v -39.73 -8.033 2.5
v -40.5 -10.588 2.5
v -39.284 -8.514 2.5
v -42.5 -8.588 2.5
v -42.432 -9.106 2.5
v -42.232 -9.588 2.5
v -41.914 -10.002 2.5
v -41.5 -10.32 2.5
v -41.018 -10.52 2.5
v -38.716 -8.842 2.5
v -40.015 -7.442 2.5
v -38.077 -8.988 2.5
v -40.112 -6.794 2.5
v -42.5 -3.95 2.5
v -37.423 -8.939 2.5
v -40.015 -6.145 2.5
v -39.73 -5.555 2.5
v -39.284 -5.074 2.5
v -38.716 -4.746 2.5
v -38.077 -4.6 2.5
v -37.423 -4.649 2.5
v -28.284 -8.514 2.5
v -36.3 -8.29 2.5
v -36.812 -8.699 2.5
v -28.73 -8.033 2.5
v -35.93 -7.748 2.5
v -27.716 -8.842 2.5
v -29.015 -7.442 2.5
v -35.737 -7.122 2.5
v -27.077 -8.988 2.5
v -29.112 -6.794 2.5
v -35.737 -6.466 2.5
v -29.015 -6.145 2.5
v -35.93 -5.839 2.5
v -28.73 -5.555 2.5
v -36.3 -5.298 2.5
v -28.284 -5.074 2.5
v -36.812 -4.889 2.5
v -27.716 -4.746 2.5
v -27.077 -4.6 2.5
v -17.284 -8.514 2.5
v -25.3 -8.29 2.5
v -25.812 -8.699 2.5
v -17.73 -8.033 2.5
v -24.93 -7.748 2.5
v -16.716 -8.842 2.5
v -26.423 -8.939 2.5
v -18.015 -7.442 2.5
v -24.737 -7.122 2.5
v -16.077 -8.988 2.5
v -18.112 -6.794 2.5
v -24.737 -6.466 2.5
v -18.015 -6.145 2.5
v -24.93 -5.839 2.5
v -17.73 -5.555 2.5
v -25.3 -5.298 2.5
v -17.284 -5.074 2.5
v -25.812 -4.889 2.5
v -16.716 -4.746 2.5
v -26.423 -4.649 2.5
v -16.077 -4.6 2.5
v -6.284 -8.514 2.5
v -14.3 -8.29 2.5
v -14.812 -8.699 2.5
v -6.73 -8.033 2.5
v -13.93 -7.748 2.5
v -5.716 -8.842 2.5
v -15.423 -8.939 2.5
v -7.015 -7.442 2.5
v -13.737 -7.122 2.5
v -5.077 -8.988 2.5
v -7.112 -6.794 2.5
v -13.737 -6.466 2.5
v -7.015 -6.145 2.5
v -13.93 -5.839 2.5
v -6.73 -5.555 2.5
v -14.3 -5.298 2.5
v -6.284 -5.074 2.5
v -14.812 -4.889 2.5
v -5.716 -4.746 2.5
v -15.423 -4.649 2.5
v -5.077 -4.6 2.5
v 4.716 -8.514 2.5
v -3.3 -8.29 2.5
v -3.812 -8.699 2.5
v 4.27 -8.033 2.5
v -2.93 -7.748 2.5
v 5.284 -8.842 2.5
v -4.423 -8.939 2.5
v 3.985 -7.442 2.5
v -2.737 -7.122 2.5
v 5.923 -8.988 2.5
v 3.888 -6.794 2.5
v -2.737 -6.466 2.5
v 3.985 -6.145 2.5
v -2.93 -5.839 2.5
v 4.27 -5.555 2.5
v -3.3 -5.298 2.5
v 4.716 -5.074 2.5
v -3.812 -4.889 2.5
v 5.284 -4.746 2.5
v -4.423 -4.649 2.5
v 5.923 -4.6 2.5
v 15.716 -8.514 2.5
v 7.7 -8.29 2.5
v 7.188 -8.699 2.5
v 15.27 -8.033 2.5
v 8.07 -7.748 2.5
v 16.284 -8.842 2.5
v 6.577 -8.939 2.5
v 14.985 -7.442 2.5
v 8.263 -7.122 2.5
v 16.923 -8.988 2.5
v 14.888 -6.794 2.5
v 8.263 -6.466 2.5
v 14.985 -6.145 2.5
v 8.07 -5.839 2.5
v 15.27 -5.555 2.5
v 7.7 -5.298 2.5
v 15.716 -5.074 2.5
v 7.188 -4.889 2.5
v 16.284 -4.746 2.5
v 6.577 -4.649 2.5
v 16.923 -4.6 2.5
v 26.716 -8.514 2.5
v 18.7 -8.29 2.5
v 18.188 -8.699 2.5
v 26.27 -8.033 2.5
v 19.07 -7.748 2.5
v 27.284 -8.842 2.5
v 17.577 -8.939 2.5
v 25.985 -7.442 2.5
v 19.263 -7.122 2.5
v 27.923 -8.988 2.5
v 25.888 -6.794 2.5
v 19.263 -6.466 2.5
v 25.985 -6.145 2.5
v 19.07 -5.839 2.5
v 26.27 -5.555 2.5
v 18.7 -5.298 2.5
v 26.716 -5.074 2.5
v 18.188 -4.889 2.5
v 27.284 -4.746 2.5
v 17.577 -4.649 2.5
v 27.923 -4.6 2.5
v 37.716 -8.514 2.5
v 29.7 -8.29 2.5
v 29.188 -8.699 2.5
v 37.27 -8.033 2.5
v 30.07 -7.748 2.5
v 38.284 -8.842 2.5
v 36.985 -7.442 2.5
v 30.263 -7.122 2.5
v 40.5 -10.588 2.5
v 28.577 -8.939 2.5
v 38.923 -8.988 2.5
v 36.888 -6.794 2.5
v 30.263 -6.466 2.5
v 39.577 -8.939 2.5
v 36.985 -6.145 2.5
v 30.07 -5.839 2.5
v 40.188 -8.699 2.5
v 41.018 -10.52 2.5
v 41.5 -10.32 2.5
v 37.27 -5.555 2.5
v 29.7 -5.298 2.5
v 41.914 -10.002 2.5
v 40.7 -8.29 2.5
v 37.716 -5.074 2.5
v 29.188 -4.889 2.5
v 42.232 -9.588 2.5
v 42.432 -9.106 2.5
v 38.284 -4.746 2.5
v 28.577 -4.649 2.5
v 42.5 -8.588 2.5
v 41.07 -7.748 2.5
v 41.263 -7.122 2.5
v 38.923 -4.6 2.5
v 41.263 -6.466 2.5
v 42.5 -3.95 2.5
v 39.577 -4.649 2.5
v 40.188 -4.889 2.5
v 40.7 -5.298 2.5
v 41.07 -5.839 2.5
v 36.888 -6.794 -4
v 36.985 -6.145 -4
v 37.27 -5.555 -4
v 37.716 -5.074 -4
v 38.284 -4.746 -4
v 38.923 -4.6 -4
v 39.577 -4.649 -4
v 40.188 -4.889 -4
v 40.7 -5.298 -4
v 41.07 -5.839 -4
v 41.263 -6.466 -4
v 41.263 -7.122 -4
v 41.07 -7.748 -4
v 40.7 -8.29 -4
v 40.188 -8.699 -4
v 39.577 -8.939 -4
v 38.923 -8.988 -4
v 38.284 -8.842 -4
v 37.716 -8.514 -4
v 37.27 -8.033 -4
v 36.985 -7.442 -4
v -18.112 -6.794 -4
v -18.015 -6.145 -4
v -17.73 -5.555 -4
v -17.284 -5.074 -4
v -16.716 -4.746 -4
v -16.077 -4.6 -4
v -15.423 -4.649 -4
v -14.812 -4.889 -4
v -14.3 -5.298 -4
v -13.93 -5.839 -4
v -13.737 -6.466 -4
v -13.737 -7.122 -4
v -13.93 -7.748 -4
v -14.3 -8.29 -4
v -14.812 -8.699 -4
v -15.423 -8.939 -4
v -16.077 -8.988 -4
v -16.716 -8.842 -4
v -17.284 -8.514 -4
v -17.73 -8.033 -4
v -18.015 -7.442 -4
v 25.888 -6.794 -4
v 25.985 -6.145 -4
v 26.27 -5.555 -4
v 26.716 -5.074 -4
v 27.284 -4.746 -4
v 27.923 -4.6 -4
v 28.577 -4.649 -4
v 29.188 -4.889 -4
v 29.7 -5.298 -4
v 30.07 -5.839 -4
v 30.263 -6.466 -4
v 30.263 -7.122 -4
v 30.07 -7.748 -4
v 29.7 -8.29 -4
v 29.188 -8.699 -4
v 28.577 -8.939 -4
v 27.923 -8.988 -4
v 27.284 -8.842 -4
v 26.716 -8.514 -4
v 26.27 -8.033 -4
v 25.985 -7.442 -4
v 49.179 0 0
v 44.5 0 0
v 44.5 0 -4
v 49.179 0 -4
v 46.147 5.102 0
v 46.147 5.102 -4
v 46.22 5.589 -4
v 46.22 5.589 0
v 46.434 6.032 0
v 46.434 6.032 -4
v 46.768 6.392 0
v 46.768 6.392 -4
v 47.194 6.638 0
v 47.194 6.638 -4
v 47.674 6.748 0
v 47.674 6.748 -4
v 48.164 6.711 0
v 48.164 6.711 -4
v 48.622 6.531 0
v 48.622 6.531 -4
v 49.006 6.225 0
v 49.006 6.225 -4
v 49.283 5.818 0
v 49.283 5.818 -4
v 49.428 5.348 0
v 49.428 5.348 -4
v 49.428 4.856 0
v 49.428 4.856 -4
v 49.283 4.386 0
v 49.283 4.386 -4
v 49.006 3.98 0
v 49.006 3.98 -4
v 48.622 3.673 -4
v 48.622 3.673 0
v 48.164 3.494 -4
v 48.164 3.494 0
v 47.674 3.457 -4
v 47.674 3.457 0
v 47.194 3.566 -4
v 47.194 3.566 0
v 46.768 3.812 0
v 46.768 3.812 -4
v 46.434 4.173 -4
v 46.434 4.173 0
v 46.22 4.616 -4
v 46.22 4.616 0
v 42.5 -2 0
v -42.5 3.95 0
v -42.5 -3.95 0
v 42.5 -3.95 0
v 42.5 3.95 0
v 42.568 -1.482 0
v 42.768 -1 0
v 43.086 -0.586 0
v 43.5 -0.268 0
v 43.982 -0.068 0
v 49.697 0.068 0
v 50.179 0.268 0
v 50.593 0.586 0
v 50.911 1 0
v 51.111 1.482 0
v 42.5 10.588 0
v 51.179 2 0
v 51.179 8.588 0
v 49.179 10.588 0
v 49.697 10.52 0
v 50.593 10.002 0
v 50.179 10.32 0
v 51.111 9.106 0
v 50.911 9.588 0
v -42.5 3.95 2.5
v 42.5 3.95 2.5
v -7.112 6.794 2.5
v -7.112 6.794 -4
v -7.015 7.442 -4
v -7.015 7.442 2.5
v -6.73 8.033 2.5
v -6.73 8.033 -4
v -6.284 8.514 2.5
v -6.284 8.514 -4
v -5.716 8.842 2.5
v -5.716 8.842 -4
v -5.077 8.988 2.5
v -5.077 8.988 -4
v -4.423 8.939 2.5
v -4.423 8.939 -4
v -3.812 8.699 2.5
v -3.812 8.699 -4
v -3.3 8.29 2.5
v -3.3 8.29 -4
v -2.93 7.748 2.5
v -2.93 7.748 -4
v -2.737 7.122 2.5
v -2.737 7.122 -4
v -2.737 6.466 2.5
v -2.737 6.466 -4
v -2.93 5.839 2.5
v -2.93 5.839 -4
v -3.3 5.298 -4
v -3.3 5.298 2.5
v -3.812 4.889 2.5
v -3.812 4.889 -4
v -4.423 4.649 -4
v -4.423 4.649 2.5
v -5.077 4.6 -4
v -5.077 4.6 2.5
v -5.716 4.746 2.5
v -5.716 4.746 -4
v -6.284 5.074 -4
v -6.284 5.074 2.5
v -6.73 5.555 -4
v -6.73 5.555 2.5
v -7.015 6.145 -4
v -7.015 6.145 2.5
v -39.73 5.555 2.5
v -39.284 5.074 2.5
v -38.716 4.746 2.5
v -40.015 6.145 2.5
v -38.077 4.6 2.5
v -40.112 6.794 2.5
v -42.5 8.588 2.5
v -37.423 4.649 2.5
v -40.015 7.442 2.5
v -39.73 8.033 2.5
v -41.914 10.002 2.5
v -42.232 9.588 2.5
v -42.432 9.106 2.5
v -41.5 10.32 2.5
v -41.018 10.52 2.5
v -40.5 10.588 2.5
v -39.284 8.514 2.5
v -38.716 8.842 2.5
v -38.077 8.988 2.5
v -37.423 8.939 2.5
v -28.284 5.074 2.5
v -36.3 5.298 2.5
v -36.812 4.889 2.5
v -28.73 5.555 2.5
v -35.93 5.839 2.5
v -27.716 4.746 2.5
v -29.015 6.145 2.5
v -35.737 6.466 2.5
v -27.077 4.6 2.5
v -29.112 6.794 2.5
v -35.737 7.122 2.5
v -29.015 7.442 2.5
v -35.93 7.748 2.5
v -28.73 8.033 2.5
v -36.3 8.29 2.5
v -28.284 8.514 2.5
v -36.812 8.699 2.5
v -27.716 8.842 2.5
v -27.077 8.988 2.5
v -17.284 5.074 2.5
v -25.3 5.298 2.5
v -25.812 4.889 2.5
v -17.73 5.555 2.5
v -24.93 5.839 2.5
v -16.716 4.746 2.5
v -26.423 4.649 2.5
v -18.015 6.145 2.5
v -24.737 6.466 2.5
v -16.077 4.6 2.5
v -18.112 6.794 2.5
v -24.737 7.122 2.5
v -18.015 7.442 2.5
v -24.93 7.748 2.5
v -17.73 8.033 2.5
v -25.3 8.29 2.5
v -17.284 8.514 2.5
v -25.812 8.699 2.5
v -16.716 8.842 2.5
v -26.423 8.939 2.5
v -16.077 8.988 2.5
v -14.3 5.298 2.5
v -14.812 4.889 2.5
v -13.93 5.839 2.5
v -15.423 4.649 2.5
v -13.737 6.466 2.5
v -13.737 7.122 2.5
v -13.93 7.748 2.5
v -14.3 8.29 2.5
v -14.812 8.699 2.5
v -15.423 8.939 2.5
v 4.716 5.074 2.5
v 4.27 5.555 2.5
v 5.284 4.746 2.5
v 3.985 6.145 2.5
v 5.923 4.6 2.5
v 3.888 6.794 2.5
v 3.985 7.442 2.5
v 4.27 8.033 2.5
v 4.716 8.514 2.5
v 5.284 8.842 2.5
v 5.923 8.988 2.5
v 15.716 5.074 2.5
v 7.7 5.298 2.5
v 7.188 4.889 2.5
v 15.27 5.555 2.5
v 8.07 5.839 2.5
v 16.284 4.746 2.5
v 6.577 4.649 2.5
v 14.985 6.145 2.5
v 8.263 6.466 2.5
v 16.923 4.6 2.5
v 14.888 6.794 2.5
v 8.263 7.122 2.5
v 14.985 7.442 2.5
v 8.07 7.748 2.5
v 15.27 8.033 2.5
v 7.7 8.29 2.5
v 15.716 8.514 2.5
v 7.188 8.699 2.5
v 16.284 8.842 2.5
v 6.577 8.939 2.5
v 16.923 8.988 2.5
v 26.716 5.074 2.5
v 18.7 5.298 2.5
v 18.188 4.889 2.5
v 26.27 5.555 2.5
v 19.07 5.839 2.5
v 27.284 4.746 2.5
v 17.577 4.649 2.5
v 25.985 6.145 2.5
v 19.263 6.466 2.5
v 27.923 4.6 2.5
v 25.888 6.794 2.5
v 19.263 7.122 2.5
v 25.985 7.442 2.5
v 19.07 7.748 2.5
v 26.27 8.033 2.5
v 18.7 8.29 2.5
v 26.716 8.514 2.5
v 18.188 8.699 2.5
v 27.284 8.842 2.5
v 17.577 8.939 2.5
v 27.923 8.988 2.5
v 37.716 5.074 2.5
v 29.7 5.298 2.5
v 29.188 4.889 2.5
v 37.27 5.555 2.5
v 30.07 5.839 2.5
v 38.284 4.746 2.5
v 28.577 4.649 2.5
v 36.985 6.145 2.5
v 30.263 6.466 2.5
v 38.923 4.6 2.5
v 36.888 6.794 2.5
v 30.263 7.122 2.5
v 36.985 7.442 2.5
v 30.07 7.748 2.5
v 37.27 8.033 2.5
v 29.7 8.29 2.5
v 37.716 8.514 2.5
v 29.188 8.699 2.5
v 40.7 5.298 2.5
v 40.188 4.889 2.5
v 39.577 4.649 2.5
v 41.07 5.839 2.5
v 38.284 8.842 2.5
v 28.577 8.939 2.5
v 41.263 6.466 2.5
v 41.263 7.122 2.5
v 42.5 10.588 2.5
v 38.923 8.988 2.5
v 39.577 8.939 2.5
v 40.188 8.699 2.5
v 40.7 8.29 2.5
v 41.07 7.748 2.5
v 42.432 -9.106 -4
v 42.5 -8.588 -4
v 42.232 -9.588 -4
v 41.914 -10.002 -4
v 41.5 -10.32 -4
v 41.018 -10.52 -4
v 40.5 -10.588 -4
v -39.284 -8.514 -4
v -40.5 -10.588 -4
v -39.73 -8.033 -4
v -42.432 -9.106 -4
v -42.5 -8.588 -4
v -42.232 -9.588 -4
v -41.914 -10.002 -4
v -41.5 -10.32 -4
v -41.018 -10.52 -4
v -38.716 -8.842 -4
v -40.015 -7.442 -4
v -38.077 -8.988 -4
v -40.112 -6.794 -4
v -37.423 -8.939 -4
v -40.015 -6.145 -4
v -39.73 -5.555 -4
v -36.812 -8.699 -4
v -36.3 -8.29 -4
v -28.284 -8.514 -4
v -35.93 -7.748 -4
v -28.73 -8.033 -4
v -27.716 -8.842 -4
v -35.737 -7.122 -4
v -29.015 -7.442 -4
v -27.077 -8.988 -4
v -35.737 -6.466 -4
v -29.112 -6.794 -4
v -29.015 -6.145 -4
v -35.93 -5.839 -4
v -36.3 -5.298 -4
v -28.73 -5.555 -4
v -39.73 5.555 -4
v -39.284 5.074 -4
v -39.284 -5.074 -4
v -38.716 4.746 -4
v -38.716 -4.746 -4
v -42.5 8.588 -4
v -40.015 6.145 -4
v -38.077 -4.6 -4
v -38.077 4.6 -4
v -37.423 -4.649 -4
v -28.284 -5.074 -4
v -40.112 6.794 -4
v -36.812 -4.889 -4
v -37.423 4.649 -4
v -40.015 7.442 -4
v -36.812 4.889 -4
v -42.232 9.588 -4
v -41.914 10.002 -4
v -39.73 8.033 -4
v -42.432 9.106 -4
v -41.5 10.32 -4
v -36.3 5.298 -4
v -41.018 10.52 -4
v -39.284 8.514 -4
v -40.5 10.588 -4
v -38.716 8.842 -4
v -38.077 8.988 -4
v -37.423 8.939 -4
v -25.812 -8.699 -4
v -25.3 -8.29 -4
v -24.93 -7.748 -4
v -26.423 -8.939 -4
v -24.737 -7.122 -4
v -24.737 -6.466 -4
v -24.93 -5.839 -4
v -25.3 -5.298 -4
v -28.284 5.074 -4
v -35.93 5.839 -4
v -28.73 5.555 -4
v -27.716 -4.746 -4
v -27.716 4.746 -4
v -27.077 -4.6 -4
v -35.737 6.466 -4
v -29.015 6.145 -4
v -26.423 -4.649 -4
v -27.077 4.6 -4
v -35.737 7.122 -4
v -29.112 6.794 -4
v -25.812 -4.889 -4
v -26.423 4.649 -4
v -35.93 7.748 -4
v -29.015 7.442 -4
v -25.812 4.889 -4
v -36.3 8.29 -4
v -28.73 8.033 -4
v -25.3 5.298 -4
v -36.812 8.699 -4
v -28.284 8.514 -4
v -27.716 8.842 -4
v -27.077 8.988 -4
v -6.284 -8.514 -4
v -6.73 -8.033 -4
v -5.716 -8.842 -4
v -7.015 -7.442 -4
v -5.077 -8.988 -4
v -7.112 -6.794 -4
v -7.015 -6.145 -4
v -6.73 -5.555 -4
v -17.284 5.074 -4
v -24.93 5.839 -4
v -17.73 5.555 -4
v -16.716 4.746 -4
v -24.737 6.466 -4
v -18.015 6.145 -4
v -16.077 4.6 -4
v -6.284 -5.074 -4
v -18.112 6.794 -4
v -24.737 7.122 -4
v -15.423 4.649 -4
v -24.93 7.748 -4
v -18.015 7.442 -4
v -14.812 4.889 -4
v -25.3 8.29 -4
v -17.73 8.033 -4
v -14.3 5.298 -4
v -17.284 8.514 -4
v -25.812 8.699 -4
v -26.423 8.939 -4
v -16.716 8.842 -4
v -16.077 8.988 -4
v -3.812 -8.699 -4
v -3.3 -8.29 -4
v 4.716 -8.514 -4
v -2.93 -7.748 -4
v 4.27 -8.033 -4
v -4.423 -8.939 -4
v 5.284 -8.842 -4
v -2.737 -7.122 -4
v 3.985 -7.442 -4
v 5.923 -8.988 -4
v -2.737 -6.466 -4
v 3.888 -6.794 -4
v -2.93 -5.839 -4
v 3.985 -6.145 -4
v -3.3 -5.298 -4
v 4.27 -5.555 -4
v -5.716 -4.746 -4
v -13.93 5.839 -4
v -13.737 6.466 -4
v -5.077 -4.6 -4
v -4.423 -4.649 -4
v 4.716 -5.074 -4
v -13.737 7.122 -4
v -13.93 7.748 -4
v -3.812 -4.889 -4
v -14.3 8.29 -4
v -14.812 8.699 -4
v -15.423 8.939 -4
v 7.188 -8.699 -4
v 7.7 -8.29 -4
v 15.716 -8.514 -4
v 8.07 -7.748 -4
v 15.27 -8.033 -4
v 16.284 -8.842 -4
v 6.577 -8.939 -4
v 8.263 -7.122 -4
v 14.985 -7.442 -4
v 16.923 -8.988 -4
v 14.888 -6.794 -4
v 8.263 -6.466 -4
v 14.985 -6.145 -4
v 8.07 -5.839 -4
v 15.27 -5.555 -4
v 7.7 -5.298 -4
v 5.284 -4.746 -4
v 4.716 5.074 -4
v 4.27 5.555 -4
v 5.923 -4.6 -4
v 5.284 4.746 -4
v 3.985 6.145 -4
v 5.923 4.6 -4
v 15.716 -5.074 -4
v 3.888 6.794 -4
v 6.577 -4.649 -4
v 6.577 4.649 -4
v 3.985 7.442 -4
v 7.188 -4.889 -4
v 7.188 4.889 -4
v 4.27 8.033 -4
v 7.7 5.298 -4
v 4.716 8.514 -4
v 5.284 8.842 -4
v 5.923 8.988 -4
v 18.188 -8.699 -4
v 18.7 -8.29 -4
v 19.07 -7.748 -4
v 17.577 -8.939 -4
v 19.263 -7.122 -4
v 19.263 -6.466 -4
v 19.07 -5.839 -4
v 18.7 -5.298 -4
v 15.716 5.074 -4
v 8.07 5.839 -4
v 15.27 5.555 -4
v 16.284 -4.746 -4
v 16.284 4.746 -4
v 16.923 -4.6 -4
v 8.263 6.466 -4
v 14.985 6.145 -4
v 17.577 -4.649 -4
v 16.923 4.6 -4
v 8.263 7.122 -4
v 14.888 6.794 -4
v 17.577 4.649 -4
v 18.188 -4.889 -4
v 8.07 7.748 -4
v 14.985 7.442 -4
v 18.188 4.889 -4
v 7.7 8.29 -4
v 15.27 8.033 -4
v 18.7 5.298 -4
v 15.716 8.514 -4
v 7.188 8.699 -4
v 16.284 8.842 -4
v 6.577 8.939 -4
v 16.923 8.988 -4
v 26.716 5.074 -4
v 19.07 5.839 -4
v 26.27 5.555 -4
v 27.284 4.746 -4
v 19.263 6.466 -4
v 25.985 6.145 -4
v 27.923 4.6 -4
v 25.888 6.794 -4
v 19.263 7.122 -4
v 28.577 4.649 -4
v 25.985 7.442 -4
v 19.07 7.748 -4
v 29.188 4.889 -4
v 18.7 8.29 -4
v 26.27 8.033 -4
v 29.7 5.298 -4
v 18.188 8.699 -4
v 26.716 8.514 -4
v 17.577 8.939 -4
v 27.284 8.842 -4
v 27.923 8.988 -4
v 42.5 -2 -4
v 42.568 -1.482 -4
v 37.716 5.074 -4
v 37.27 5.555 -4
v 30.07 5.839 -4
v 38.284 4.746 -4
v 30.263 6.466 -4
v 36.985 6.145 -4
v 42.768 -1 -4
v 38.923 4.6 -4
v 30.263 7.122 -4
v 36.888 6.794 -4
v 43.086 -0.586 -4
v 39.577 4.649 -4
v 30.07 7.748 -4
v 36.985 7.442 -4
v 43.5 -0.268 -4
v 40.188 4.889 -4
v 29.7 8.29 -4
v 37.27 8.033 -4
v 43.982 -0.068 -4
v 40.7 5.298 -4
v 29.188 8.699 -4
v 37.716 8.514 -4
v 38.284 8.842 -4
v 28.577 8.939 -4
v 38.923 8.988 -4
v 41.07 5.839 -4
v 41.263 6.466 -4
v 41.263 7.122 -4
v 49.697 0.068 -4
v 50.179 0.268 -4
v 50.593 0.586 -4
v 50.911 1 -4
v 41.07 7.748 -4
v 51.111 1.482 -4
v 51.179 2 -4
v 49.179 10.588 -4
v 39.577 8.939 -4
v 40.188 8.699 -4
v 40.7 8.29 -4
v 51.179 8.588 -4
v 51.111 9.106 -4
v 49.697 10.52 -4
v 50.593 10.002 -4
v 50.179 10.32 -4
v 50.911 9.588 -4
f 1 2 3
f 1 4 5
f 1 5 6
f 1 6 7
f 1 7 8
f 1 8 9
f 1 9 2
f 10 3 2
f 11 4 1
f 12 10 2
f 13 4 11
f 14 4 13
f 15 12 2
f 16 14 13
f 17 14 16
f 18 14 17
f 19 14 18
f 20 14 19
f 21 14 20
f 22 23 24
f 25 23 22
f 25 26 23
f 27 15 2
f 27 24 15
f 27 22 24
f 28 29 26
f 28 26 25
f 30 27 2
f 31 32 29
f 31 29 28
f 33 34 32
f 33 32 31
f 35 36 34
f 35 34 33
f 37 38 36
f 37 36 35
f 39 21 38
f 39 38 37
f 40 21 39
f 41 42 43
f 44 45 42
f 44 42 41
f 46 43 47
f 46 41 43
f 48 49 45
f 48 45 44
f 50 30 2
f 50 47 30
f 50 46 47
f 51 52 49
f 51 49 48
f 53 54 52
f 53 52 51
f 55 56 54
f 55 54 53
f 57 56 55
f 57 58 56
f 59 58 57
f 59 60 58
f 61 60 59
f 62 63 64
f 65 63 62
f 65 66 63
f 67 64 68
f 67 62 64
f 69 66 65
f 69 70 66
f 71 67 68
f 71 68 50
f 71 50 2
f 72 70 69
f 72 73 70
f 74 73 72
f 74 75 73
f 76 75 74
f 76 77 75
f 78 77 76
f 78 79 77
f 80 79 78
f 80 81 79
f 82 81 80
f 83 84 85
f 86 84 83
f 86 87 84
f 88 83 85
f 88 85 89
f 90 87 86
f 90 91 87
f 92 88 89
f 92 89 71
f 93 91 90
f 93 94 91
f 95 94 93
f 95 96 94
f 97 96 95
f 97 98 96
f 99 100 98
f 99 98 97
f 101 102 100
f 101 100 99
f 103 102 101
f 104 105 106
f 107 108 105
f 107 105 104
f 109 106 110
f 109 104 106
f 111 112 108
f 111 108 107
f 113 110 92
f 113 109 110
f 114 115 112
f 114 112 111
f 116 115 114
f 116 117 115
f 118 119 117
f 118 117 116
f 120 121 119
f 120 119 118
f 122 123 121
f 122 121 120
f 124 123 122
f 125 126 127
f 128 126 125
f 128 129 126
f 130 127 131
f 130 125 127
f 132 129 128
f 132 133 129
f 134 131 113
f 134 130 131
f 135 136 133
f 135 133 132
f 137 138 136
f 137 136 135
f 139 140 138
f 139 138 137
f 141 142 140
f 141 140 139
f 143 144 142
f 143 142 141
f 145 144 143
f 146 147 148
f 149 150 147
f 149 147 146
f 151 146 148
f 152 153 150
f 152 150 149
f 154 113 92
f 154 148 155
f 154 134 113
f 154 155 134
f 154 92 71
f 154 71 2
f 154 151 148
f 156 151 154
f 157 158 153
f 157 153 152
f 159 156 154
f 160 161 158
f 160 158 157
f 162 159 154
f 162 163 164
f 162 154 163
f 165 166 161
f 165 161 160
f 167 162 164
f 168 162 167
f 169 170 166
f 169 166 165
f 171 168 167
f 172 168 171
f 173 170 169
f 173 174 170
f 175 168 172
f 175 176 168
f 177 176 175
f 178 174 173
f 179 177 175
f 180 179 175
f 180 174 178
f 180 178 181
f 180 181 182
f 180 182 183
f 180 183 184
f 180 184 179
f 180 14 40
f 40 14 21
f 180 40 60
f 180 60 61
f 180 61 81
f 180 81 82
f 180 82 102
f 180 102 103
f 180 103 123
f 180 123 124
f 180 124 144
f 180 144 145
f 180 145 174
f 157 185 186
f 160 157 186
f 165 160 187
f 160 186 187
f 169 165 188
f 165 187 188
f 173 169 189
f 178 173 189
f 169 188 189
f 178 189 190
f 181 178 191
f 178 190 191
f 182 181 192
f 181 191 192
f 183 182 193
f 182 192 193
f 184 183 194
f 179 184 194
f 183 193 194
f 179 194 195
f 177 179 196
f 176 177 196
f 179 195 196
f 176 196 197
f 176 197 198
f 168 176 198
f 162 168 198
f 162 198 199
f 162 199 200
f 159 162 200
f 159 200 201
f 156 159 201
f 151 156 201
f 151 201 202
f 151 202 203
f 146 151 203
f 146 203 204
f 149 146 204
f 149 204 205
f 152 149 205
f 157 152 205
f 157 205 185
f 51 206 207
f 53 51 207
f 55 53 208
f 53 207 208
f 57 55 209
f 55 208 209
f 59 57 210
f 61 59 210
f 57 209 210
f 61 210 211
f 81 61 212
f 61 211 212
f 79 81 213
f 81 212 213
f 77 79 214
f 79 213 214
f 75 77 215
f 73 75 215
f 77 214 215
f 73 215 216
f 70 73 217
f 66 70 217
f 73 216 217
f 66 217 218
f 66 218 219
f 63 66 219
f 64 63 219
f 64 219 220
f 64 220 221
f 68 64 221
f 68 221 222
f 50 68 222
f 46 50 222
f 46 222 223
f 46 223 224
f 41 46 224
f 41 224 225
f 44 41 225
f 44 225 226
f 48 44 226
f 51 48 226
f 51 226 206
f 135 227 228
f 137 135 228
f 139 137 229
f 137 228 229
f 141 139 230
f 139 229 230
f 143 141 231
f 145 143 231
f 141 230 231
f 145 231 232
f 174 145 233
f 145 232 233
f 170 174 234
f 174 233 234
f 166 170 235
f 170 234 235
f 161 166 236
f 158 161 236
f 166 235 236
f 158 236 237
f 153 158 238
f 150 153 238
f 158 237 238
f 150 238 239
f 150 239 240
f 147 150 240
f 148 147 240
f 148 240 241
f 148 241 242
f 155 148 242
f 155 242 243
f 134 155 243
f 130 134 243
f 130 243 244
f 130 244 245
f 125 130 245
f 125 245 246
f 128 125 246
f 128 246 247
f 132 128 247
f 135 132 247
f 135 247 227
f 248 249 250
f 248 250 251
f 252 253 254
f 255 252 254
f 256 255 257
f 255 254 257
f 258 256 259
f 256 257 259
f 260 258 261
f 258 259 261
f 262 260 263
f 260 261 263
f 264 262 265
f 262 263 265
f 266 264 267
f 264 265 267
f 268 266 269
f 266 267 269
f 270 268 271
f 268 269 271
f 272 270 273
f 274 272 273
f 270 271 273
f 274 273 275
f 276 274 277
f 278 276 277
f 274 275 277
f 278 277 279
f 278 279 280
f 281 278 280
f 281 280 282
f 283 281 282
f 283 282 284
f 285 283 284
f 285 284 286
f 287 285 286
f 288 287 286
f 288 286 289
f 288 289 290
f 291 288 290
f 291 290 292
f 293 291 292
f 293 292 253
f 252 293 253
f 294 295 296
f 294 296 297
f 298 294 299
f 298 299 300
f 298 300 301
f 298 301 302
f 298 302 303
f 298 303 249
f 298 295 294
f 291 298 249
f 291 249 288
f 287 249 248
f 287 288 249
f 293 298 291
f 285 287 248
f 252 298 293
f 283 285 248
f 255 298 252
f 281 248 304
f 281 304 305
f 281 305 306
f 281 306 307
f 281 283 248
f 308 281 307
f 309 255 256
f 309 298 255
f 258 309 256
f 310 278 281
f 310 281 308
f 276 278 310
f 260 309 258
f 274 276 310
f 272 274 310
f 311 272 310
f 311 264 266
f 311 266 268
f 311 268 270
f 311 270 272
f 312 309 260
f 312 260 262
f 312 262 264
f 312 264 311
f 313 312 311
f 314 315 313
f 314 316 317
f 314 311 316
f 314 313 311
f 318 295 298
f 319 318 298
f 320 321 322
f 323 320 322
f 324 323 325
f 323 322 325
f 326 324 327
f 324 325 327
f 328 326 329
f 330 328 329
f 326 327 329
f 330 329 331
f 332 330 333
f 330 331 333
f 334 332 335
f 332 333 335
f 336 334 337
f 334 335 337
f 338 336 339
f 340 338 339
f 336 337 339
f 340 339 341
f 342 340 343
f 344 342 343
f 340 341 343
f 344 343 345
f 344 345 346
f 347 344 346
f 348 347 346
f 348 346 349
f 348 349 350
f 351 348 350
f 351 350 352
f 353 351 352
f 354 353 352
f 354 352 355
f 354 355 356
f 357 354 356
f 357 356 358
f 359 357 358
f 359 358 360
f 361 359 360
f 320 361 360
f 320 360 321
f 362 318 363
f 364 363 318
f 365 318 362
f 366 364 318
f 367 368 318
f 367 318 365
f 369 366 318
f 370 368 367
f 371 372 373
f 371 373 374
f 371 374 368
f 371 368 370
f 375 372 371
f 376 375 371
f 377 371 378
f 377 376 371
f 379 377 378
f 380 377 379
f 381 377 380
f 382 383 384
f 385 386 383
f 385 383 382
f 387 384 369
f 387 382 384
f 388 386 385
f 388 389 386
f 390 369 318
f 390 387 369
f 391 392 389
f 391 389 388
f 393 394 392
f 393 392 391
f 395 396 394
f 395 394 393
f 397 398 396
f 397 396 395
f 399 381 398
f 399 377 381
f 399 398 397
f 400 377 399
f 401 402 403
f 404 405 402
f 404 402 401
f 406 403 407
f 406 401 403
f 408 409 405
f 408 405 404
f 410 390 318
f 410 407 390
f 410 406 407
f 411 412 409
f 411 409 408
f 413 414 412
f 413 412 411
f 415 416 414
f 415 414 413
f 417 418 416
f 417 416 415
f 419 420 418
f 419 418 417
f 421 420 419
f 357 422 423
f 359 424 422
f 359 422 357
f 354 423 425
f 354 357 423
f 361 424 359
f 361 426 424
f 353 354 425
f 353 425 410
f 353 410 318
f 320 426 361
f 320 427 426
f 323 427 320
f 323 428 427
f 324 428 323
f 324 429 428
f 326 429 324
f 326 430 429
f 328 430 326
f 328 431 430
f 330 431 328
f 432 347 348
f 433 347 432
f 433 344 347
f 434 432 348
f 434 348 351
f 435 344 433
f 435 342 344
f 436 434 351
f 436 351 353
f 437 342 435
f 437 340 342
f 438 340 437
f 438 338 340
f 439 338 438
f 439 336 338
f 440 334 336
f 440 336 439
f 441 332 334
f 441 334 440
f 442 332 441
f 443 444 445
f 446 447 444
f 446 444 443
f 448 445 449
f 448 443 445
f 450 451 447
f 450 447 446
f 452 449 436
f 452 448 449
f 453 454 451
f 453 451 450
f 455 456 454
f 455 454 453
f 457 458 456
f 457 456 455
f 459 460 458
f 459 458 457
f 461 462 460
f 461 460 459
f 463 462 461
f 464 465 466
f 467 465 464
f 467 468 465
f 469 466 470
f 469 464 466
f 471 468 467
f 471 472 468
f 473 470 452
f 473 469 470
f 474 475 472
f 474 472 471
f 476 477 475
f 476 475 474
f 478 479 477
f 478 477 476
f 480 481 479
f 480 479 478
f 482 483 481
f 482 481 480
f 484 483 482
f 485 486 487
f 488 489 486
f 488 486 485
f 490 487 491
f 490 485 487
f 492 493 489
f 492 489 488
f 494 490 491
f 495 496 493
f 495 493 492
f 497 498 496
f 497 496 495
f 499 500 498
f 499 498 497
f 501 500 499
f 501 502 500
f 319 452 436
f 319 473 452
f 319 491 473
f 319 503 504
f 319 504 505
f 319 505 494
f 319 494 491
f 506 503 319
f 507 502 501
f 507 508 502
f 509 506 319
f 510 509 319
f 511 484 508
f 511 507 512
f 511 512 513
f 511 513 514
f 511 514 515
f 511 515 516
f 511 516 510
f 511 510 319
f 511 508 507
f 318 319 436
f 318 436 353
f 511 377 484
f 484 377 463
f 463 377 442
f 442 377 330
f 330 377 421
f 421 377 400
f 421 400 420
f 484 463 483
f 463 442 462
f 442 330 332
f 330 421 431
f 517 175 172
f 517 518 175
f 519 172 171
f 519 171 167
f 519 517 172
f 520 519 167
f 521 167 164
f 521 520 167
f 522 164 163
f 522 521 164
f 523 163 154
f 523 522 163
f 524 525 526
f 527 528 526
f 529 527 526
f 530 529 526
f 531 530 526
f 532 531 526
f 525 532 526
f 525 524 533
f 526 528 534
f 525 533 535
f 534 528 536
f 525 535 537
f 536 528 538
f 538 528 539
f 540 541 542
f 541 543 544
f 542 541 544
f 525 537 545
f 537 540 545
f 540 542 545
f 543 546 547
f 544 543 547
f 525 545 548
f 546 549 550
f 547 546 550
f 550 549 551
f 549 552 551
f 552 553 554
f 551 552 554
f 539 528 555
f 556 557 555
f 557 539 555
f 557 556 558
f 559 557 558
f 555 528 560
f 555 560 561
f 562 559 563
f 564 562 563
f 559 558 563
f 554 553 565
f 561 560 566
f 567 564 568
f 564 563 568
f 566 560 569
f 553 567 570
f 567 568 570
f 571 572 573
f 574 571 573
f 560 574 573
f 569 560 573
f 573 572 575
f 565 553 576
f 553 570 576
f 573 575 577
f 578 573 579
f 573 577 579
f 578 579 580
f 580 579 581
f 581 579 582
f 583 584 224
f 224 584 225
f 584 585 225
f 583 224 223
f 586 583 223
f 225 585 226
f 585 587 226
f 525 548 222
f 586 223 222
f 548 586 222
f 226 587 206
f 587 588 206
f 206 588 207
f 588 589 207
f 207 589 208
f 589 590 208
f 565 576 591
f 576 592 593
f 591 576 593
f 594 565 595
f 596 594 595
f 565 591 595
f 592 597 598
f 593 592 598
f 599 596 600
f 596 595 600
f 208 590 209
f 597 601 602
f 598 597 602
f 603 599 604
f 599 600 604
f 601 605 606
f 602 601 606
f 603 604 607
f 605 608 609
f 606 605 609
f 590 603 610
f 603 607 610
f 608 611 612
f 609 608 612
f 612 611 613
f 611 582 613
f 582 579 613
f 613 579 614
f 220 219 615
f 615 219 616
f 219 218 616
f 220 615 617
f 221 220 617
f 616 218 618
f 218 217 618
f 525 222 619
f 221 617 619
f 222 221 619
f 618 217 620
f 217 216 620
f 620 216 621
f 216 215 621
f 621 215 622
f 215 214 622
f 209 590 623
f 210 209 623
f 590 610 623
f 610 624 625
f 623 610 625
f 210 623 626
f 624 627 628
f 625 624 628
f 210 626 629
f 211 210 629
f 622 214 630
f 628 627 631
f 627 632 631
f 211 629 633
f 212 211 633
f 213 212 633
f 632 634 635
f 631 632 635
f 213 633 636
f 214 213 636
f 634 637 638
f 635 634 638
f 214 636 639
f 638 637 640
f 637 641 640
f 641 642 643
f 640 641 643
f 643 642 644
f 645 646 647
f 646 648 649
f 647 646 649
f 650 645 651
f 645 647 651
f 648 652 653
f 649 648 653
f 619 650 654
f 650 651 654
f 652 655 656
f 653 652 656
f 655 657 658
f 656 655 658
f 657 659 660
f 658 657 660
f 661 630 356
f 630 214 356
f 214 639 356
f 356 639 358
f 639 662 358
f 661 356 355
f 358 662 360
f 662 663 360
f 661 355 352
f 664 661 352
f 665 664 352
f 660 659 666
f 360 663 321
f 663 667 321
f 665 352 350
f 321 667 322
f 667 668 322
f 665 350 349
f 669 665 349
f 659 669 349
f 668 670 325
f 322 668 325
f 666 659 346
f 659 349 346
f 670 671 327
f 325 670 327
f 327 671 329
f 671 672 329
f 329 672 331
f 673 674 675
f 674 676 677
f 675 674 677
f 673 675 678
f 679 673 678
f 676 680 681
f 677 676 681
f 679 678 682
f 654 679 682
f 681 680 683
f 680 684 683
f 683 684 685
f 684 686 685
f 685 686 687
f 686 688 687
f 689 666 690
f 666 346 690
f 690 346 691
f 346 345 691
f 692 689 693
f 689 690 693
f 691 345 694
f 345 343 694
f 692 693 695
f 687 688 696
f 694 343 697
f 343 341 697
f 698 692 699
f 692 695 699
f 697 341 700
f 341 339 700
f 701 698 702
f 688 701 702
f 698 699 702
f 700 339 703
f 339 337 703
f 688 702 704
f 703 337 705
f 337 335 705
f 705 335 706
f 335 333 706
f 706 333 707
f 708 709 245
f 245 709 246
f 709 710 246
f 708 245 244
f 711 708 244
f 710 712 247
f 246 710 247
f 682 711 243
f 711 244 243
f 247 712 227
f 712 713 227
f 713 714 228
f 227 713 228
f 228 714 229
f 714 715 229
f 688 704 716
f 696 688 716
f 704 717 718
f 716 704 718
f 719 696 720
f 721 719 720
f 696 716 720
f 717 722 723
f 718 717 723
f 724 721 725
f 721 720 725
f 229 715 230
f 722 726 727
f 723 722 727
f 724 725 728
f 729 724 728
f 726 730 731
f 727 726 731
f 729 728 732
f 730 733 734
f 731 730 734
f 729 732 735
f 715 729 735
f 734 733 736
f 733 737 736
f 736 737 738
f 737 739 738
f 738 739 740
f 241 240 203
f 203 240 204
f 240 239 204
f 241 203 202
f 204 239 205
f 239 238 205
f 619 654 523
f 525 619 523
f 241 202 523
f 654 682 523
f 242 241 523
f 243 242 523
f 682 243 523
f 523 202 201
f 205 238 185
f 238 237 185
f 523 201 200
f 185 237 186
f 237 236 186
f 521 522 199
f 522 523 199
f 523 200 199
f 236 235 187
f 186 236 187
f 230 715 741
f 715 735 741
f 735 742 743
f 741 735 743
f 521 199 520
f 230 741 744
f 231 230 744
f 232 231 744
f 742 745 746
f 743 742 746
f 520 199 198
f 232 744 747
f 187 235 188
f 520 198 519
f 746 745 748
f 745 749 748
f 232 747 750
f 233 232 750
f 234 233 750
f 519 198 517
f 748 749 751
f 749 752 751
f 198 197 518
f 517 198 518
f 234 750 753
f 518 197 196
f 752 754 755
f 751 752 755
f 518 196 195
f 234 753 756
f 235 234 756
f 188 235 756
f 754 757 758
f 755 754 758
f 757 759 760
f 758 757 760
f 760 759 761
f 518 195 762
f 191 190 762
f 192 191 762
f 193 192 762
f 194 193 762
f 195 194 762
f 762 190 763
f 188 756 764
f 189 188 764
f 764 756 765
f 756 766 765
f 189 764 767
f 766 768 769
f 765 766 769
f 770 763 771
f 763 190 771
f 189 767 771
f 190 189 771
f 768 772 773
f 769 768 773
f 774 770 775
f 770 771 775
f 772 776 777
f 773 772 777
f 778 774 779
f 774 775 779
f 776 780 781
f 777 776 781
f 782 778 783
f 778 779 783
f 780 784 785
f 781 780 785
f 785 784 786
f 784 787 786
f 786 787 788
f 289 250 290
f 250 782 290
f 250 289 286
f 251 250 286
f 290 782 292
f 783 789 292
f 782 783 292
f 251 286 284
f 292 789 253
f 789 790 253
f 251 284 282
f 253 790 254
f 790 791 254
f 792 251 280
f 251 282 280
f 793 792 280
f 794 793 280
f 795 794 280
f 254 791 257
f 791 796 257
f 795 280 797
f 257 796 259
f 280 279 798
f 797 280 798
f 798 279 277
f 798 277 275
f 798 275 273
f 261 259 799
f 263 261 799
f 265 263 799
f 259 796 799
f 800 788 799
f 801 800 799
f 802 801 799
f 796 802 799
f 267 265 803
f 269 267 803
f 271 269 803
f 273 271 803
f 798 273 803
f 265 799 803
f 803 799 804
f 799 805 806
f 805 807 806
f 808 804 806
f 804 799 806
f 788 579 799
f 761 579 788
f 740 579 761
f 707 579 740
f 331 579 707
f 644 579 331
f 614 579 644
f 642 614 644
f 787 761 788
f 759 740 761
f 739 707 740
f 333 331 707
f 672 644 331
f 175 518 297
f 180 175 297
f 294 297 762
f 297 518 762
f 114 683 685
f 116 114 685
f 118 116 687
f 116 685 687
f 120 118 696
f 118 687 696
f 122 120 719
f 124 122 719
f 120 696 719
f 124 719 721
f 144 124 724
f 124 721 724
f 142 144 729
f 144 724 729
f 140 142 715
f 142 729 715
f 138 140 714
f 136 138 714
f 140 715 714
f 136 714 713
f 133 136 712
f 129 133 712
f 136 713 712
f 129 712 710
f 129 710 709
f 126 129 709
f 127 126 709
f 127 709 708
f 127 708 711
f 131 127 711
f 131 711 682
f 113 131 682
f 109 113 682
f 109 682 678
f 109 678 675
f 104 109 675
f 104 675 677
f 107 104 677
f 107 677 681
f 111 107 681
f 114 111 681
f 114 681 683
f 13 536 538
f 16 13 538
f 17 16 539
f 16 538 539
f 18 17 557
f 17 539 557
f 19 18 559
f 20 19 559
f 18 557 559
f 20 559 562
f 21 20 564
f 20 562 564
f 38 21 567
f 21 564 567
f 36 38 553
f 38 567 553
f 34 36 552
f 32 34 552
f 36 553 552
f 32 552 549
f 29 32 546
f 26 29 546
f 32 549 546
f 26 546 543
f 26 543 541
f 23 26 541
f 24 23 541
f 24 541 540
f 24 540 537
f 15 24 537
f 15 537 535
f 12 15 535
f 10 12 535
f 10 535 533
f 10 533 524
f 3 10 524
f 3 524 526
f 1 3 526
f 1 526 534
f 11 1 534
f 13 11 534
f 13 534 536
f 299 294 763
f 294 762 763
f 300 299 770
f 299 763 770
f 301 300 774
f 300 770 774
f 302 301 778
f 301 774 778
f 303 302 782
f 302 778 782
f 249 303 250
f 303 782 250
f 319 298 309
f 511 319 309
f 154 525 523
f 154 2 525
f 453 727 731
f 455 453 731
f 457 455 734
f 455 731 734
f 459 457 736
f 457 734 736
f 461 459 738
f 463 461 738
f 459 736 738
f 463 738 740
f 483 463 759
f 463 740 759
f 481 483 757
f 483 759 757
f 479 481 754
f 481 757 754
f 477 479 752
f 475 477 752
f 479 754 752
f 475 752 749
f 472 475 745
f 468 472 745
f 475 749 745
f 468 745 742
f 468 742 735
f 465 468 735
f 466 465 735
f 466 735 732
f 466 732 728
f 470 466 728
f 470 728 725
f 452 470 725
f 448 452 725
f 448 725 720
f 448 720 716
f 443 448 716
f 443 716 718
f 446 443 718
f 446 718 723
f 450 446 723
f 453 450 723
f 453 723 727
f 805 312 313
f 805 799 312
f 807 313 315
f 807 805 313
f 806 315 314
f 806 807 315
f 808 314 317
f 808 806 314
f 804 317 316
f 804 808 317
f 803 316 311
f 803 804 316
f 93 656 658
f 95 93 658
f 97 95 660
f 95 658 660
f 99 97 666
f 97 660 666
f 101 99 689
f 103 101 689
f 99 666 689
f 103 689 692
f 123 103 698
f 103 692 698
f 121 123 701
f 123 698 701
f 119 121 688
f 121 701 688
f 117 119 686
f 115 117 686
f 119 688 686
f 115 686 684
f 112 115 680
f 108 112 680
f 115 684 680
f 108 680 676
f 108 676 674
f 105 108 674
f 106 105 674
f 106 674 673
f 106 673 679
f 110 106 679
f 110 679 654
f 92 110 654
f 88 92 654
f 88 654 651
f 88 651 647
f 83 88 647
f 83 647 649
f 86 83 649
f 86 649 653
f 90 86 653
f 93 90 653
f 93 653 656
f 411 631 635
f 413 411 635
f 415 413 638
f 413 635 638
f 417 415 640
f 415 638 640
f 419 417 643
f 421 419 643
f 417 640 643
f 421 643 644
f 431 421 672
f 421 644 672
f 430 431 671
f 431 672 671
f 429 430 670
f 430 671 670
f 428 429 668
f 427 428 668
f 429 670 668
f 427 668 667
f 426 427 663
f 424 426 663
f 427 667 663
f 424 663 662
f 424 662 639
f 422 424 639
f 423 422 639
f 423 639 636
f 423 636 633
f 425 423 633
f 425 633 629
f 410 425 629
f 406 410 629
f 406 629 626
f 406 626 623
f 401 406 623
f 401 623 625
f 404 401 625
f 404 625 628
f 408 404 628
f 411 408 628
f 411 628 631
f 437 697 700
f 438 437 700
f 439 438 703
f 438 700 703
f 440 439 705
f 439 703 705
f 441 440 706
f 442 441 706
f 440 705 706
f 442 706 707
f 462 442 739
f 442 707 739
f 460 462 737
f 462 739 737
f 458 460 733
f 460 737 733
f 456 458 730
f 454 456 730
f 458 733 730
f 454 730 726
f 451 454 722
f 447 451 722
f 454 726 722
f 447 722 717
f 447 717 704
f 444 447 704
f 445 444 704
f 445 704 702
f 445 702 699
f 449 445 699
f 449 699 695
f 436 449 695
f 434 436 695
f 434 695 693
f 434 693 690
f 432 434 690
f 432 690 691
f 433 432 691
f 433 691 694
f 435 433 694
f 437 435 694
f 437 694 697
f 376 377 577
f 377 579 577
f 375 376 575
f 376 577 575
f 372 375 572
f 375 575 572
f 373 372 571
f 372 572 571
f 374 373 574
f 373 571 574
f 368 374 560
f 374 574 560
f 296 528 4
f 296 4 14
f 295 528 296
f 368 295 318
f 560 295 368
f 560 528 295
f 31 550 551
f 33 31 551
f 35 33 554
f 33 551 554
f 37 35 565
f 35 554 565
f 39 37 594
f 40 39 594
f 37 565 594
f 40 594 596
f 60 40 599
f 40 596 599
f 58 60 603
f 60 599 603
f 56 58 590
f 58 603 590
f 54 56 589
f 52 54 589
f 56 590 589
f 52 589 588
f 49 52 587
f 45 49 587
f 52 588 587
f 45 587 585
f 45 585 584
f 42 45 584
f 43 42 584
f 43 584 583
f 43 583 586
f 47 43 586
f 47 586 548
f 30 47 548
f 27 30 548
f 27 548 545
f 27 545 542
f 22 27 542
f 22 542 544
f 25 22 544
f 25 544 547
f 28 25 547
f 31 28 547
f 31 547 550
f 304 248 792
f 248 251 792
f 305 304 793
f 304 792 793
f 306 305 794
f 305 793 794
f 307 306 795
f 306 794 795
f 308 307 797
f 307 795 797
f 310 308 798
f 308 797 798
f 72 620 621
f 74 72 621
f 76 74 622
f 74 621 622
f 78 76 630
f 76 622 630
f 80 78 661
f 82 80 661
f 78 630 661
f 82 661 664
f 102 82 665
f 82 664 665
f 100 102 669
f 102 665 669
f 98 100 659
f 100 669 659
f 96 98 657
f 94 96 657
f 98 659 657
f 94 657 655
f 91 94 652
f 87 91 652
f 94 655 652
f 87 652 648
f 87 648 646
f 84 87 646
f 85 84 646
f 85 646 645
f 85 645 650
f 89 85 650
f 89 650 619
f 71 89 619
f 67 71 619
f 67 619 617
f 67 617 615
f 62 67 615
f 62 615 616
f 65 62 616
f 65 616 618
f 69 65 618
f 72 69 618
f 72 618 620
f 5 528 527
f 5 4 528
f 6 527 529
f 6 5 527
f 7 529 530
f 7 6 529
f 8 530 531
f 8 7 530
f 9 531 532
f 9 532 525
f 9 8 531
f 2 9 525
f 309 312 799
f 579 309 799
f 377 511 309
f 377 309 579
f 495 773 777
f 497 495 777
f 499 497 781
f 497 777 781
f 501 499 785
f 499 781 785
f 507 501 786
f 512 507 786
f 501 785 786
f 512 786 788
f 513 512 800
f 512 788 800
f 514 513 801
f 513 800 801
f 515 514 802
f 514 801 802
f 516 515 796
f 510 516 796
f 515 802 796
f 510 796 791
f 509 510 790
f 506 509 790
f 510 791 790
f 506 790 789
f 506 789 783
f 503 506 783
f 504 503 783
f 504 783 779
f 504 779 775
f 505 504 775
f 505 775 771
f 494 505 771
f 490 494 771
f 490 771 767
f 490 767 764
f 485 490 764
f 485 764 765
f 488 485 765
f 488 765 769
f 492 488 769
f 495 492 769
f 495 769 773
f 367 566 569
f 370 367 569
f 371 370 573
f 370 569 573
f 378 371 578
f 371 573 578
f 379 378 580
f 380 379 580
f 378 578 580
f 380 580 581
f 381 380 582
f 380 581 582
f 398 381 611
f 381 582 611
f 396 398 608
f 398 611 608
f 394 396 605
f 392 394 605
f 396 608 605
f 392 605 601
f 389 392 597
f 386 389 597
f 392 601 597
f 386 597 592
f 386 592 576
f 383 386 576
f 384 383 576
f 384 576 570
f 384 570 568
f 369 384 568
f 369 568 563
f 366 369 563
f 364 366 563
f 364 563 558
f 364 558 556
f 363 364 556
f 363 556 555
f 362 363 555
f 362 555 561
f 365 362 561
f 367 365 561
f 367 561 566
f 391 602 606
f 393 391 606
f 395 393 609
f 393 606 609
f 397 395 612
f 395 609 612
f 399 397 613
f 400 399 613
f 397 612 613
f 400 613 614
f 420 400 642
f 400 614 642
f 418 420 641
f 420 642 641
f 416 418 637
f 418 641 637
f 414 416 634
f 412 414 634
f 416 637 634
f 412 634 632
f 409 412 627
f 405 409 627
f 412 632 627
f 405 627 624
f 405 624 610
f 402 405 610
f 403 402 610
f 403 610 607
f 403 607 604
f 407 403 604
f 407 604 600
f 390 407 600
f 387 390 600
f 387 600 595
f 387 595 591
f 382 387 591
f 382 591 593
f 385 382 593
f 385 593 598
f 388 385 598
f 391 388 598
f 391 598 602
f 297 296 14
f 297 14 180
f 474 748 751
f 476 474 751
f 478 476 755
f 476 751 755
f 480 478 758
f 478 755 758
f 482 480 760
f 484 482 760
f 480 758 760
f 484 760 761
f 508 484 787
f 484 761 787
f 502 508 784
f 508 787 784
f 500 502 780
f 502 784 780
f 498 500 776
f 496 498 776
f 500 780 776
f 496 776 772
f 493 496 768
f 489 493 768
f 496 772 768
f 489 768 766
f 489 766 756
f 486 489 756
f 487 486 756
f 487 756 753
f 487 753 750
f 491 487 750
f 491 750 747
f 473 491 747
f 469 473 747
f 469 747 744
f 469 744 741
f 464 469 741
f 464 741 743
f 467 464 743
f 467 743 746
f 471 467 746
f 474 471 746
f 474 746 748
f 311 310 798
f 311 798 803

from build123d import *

# Parameters (mm, degrees)
F0_W     = 85
F0_H     = 6.6378710747
F0_H_2   = 7.9
F1_DEPTH = 4
F2_DEPTH = 2.5
F4_D     = 4.4
F4_DEPTH = 25
F4_TIP   = 1.3218933619
F6_DEPTH = 4
F7_D     = 3.3
F7_DEPTH = 25
F7_TIP   = 0.9914200214
F8_R     = 2


with BuildPart() as f1:
    # F0 (on Top) → F1 (new body)
    with BuildSketch(Plane.XY):
        with Locations((0, 7.2689355373)):
            Rectangle(F0_W, F0_H)
        Rectangle(F0_W, F0_H_2)
        with Locations((0, -7.2689355373)):
            Rectangle(F0_W, F0_H)
    extrude(amount=-F1_DEPTH)

    # F0 (on Top) → F2 (join)
    with BuildSketch(Plane.XY):
        with Locations((0, 7.2689355373)):
            Rectangle(F0_W, F0_H)
        with Locations((0, -7.2689355373)):
            Rectangle(F0_W, F0_H)
    extrude(amount=F2_DEPTH)

    # F4
    with Locations(Plane.XY.offset(2.5)):
        with Locations((-37.9123874009, 6.7939041182), (-37.9123874009, -6.7939041182), (-26.9123874009, 6.7939041182), (-26.9123874009, -6.7939041182), (-15.9123874009, 6.7939041182), (-15.9123874009, -6.7939041182), (-4.9123874009, 6.7939041182), (-4.9123874009, -6.7939041182), (6.0876125991, 6.7939041182), (6.0876125991, -6.7939041182), (17.0876125991, -6.7939041182), (17.0876125991, 6.7939041182), (28.0876125991, 6.7939041182), (28.0876125991, -6.7939041182), (39.0876125991, -6.7939041182), (39.0876125991, 6.7939041182)):
            Hole(F4_D / 2, depth=F4_DEPTH)
            with Locations((0, 0, -(F4_DEPTH + F4_TIP / 2))):  # 118° drill point
                Cone(0, F4_D / 2, F4_TIP, mode=Mode.SUBTRACT)

    # F5 (on Top) → F6 (join)
    with BuildSketch(Plane.XY):
        Polygon((51.1790141463, 10.5878710747), (42.4563325942, 10.5878710747), (42.5, 0), (51.1790141463, 0), align=None)
    extrude(amount=-F6_DEPTH)

    # F7
    with Locations(Plane.XY):
        with Locations((47.7968230844, 5.1023042761)):
            Hole(F7_D / 2, depth=F7_DEPTH)
            with Locations((0, 0, -(F7_DEPTH + F7_TIP / 2))):  # 118° drill point
                Cone(0, F7_D / 2, F7_TIP, mode=Mode.SUBTRACT)

    # F8
    f8_edges = [f1.edges().sort_by_distance(p)[0] for p in [
        (-42.5, 10.587871, -0.75),
        (-42.5, -10.587871, -0.75),
        (51.179014, 10.587871, -2),
        (51.179014, 0, -2),
        (42.5, -10.587871, -0.75),
        (42.5, 0, -2),
    ]]
    fillet(f8_edges, radius=F8_R)


solid = f1.part
